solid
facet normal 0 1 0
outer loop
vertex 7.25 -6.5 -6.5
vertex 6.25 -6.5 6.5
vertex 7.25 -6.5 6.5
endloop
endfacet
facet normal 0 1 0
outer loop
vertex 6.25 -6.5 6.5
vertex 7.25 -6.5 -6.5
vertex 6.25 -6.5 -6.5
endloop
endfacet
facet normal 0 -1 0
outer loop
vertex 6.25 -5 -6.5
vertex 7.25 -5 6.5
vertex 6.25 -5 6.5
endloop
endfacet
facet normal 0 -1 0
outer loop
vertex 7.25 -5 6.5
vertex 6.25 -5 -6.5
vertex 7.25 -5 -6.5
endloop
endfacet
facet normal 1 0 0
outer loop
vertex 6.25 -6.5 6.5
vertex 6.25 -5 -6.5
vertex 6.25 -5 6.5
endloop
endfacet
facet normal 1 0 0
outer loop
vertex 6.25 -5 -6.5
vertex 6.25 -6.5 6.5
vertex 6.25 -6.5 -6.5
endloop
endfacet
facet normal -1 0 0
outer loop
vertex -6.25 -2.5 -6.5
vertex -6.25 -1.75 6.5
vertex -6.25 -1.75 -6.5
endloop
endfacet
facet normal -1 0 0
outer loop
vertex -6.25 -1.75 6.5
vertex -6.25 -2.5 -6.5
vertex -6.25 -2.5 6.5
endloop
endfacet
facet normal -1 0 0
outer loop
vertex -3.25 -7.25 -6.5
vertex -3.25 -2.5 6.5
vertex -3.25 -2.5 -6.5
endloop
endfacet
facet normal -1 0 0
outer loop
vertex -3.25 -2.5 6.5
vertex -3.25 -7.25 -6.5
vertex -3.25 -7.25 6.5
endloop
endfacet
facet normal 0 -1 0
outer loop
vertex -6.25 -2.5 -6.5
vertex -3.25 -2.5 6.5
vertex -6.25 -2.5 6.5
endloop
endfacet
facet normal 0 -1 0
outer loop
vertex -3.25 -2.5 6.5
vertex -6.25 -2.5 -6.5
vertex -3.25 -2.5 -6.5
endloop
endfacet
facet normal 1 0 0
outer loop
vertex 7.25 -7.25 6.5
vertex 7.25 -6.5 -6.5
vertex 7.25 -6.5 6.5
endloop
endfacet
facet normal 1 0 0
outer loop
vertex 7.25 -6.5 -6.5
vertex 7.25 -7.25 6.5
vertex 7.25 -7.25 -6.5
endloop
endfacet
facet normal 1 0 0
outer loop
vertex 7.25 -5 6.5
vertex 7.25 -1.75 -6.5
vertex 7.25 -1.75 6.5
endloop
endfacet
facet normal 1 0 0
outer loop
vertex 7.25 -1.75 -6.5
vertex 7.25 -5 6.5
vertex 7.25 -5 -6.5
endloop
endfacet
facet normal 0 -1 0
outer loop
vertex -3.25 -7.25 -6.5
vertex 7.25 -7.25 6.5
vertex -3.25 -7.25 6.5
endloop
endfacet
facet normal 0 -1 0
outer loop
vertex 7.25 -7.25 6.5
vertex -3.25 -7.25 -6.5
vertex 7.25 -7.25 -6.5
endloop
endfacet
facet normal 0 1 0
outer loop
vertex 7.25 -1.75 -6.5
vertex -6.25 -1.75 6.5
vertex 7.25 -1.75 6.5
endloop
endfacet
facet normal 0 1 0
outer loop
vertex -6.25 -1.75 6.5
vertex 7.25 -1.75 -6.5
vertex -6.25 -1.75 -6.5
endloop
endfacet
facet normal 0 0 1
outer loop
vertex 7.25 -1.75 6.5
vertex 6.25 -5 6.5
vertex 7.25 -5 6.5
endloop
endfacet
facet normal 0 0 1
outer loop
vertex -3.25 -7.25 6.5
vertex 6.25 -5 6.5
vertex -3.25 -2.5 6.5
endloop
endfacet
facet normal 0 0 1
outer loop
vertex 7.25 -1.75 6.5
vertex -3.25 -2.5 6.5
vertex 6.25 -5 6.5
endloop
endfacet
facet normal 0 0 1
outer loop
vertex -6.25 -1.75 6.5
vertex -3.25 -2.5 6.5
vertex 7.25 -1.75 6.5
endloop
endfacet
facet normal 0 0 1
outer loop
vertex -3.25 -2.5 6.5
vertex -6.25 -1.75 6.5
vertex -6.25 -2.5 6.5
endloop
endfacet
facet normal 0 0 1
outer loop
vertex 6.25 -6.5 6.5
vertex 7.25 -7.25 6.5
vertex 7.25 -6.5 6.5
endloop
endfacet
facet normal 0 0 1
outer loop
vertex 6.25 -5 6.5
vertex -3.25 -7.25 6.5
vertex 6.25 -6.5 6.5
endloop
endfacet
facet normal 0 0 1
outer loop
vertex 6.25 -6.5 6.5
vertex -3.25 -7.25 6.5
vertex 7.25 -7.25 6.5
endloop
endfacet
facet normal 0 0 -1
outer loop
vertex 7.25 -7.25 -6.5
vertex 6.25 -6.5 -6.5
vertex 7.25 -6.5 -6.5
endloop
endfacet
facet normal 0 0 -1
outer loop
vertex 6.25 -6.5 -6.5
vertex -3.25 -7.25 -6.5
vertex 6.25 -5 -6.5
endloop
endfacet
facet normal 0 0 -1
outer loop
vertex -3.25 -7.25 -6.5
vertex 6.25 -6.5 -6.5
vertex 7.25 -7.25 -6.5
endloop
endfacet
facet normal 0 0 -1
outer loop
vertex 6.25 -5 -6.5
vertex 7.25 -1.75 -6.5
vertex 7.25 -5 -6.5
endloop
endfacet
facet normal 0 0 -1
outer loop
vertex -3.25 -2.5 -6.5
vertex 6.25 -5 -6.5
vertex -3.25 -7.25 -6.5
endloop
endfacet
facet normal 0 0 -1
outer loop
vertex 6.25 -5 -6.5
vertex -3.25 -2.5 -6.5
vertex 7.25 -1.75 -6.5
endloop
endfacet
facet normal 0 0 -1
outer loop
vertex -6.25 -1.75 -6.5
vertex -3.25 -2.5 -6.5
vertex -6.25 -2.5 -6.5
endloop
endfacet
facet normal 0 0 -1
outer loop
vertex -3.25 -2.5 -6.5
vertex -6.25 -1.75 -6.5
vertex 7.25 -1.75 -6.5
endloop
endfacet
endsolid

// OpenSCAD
// Stab hole - Change width to 7 for the smaller hole
width = 12.5;
//width = 7;
module plate_pcb() {
	translate([0, 0, 1.5]) {
		translate([0, 0, 3.5])
		translate([0, 0, 0.75])
		difference() {
			// Plate
			cube([30, 30, 1.5], center=true);

			// Stab hole
			cube([width, 13.5, 3], center=true);
		}

		//PCB
		translate([0, 0, -0.75])
		color("green")
		cube([30, 30, 1.5], center=true);
	}
}

/*/ costar
translate([-width/2, -13.5/2, 2.5])
color("black")
cube([3, 13.5, 8]);
*/

//plate_pcb();

//begin stab-stab
rotate([90, 0, 0])
difference() {
	plate_lip = 1;
	z_offset = 0.5;
	translate([plate_lip/2, 0, 4+z_offset])
	color("yellow")
	cube([width+plate_lip, 13, 5+z_offset], center=true);
	union() {
		plate_pcb();
		// costar
		translate([-width/2, -13.5/2, 2.5])
		color("black")
		cube([3, 13.5, 8]);
	}
}
